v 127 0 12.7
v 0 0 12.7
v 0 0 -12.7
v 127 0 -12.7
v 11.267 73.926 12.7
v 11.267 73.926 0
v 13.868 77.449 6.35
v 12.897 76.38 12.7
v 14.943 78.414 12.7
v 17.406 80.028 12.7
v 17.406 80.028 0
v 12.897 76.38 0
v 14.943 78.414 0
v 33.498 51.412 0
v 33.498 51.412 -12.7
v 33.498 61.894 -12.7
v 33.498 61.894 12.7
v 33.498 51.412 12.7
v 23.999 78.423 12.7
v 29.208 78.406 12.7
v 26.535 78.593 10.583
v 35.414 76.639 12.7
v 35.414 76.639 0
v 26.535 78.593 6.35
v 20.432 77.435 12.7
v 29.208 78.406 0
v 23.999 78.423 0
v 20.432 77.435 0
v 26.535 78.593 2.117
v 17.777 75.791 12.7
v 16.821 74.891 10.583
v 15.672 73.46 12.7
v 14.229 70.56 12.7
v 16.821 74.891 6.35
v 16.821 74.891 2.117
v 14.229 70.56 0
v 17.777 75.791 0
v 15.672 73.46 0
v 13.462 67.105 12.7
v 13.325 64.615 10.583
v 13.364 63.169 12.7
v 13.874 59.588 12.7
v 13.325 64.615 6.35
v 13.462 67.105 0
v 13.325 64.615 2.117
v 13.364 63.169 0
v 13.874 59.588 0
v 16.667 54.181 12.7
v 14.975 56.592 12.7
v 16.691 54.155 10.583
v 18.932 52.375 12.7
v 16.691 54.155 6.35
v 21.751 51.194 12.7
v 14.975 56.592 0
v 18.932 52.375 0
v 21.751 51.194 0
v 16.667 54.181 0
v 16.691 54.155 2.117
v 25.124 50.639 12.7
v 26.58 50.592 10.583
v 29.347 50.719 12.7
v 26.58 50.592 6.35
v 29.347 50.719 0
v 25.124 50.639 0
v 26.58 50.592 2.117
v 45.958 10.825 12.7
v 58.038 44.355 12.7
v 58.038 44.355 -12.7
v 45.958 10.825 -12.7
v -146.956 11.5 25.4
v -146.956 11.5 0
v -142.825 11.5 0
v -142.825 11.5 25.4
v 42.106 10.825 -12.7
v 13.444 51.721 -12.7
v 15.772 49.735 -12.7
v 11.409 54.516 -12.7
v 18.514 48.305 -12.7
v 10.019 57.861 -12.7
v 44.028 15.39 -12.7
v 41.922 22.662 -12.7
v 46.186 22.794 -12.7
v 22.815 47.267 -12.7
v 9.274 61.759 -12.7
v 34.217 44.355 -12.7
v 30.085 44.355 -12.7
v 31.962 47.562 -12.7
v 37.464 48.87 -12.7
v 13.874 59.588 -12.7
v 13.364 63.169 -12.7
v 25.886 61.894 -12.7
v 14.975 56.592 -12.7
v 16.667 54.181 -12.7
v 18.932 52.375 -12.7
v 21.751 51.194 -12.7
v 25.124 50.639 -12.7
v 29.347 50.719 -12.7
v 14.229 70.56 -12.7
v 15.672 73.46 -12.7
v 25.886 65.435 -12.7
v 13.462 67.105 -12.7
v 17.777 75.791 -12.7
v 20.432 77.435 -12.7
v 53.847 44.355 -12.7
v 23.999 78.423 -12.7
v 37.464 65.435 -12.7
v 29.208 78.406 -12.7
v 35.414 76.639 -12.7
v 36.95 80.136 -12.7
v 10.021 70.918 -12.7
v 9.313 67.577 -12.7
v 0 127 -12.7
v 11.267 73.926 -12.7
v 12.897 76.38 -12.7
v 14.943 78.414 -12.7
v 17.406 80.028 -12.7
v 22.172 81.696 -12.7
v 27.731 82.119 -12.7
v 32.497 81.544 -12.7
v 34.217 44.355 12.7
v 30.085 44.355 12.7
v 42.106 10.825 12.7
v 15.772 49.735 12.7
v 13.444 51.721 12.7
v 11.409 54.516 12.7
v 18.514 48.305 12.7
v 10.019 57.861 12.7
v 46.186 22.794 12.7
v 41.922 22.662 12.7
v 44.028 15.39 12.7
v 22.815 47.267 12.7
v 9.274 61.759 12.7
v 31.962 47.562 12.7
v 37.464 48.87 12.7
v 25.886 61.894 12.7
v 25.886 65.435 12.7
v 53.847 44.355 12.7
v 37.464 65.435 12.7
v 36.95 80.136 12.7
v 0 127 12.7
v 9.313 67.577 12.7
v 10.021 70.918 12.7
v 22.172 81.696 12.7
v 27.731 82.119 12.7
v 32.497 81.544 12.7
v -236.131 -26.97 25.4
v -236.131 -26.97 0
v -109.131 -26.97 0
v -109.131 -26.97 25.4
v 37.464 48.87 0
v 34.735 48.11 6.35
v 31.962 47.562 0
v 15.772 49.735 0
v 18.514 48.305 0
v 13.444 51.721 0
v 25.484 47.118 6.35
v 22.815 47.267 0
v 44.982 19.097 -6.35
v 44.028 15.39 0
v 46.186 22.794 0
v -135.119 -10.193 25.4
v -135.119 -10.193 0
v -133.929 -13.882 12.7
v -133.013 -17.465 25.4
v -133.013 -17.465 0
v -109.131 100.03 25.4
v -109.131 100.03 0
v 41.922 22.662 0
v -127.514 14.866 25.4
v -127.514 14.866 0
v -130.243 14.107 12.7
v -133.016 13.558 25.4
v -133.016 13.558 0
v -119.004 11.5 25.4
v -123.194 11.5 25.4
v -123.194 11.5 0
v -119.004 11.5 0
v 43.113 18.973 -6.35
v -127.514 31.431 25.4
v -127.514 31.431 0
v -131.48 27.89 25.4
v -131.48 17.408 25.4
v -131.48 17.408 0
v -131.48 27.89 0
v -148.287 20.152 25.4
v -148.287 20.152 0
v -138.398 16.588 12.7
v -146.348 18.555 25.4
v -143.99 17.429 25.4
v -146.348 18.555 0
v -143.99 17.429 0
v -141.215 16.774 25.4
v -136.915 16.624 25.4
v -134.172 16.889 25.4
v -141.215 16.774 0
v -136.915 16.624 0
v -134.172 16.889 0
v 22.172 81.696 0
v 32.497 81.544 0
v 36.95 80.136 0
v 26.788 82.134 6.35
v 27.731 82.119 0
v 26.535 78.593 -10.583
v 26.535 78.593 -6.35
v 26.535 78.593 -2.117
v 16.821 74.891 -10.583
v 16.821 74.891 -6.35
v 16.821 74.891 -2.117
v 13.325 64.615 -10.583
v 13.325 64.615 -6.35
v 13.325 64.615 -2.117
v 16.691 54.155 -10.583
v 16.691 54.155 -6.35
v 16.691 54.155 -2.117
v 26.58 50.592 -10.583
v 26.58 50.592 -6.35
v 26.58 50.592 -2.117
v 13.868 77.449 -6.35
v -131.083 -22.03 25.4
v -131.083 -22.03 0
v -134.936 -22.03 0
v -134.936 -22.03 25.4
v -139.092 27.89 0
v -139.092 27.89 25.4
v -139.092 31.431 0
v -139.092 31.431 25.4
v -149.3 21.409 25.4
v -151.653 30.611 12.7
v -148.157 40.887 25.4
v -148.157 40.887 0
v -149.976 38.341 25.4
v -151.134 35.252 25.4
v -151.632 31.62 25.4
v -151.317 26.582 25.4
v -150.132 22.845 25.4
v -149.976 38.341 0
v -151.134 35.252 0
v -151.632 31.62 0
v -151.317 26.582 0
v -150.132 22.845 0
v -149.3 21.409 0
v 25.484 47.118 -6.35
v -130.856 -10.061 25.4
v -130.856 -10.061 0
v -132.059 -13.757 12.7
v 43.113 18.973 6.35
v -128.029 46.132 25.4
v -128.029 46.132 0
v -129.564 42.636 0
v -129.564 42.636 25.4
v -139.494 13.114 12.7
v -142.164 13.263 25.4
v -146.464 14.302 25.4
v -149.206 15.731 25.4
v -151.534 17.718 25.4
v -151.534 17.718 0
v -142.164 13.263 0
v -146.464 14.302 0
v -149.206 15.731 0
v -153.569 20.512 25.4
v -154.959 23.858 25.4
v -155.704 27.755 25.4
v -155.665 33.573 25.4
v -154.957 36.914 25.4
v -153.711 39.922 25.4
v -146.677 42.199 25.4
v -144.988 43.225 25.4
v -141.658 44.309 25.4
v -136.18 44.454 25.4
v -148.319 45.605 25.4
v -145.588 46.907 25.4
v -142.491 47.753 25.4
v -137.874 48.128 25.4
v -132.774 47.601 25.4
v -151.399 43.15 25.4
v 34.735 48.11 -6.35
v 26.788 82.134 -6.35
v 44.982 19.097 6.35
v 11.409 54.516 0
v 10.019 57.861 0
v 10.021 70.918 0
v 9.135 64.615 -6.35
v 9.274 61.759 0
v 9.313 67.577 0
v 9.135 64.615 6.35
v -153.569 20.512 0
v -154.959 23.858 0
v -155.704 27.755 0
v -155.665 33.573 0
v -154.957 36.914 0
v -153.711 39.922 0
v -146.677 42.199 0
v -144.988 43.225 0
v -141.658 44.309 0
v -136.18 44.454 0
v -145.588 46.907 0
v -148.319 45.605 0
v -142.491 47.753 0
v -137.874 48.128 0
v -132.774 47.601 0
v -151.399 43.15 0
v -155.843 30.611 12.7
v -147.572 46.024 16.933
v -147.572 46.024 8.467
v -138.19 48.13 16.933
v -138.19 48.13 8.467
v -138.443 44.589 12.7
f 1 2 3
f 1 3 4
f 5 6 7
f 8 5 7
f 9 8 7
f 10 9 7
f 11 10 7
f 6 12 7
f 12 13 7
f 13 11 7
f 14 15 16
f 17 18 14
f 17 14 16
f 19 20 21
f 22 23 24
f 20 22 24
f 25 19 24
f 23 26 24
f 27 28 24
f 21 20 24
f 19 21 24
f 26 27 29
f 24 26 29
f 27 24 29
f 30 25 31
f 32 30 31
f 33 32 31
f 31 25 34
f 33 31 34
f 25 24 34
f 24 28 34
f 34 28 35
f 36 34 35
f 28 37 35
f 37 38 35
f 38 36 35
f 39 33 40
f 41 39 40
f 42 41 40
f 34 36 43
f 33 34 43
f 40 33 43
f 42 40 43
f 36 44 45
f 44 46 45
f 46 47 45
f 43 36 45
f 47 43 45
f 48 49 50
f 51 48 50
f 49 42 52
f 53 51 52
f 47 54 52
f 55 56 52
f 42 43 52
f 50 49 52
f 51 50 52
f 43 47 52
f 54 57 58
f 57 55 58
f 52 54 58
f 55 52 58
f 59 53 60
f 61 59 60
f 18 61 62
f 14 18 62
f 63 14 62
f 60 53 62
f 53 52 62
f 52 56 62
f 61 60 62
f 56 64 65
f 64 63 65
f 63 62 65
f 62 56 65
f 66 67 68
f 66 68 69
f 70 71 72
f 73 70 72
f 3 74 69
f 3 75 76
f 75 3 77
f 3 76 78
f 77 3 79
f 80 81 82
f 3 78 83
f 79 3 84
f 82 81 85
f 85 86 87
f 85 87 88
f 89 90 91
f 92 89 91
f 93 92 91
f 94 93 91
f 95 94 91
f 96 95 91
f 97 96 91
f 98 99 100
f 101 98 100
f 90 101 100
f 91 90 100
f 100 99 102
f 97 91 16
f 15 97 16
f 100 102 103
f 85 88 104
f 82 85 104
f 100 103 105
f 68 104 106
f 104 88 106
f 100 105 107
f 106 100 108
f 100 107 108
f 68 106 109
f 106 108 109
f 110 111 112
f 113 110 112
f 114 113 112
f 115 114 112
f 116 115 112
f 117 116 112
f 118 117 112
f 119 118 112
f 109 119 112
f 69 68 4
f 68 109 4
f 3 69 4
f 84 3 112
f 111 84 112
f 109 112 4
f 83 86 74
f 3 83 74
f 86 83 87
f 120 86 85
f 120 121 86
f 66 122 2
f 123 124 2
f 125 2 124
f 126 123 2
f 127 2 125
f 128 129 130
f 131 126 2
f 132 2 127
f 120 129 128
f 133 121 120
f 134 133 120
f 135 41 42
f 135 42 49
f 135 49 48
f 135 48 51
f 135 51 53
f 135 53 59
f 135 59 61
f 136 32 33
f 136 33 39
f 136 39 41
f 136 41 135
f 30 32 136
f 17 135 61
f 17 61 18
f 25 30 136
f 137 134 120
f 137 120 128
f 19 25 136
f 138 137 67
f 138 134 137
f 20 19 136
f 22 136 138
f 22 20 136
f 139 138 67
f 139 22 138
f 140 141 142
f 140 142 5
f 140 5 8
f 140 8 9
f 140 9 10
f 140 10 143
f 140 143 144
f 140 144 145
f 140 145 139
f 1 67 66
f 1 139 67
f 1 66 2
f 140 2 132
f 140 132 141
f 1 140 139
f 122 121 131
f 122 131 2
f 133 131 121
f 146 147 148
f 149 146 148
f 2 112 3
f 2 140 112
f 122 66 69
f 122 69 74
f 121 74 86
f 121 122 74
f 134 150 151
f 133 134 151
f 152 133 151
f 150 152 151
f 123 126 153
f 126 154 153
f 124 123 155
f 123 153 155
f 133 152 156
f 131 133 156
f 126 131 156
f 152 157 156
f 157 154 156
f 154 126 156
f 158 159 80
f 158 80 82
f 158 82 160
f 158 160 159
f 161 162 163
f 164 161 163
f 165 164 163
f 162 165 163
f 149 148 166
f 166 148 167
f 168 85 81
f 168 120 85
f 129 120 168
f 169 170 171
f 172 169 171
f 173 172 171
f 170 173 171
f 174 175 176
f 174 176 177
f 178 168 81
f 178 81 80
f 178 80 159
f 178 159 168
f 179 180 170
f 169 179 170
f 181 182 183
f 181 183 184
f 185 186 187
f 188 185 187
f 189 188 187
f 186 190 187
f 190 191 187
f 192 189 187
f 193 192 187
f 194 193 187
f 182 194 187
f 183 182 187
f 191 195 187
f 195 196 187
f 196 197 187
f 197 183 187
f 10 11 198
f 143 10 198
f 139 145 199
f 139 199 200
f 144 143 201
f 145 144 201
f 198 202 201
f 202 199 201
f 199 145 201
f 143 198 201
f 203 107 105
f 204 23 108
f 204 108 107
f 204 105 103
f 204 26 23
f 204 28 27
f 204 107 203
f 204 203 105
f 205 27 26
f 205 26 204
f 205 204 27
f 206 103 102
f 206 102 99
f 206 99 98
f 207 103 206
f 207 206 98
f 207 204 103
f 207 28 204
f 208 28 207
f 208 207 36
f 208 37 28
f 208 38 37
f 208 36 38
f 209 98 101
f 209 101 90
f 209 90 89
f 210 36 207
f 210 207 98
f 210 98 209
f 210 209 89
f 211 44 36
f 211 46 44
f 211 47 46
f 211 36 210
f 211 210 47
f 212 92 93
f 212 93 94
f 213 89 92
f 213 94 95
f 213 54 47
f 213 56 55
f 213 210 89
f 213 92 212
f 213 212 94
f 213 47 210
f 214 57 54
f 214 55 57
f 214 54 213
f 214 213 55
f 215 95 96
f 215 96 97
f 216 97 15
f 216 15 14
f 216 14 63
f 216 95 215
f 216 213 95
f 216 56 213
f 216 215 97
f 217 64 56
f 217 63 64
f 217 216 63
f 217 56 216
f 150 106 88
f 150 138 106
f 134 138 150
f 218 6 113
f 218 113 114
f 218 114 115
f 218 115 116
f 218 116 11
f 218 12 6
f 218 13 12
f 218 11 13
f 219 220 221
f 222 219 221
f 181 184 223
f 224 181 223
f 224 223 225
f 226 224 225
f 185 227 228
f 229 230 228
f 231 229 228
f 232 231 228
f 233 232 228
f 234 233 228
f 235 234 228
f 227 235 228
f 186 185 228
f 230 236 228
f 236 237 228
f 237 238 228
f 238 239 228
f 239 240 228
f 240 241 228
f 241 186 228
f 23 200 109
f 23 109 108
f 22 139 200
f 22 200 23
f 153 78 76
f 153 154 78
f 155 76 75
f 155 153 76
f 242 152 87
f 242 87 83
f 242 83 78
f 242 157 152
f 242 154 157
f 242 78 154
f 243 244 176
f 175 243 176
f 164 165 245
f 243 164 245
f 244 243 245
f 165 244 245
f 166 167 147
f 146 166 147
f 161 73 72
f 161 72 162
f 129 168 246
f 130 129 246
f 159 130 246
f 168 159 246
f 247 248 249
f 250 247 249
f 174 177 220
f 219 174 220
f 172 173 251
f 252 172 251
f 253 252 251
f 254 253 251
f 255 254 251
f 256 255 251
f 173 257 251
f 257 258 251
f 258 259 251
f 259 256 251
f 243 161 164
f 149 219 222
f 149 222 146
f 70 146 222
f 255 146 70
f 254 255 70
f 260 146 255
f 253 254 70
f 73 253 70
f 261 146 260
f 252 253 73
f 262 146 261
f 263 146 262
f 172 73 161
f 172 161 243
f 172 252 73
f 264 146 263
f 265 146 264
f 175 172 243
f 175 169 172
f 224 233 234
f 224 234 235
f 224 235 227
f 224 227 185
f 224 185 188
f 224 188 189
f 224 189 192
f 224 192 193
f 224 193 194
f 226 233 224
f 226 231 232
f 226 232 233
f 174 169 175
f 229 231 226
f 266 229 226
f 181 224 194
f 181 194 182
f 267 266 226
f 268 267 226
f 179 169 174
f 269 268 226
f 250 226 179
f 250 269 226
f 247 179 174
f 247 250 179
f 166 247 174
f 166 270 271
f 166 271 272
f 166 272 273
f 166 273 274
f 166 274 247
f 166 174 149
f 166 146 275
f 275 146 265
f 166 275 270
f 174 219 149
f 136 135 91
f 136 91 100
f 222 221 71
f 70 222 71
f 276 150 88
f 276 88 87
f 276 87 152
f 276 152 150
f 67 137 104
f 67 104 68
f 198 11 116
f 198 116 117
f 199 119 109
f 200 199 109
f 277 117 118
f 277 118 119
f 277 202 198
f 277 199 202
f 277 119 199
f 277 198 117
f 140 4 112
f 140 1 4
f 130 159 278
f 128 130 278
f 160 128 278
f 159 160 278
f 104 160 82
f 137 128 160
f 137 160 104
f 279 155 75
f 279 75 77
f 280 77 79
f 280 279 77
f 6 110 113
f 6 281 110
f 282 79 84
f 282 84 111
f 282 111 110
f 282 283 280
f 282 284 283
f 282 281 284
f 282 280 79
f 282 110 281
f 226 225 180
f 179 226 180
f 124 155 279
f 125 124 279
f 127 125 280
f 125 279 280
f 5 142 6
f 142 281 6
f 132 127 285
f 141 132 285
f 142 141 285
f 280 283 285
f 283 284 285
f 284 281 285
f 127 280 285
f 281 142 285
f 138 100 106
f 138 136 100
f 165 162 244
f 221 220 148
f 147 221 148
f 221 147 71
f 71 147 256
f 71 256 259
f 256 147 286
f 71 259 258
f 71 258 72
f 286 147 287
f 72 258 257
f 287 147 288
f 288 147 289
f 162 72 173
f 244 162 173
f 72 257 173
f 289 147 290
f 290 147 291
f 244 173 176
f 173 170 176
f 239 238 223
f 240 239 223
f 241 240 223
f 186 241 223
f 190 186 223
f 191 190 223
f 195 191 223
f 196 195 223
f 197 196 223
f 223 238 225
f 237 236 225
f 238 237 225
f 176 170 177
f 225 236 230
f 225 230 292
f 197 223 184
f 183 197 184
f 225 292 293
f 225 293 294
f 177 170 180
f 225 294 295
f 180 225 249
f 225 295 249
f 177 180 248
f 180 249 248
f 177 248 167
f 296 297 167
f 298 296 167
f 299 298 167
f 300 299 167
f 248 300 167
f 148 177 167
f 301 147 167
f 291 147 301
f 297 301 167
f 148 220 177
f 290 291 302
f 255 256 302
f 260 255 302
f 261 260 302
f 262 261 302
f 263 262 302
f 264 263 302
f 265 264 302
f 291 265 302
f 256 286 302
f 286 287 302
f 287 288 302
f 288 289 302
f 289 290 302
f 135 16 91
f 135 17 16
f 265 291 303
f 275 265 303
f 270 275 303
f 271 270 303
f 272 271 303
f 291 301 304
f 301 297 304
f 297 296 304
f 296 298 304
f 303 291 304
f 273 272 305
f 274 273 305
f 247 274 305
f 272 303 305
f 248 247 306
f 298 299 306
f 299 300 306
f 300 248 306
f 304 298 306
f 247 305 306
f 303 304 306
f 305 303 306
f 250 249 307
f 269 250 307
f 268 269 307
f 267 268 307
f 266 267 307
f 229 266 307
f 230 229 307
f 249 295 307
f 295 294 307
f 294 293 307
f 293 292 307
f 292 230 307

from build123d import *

# Parameters (mm, degrees)
F1_DEPTH = 12.7
F3_DEPTH = 25.4


with BuildPart() as f1:
    # F0 (on Top) → F1 (new body, symmetric)
    with BuildSketch(Plane.XY):
        Polygon((0, 127), (0, 0), (127, 0), align=None)
        with BuildLine():
            Line((46.1859858478, 22.7941921039), (53.8473209017, 44.3545392191))
            Line((53.8473209017, 44.3545392191), (58.037572162, 44.3545392191))
            Line((58.037572162, 44.3545392191), (45.9584940982, 10.8251906931))
            Line((45.9584940982, 10.8251906931), (42.1058112406, 10.8251906931))
            Line((42.1058112406, 10.8251906931), (30.0854407251, 44.3545392191))
            Line((30.0854407251, 44.3545392191), (34.2169844371, 44.3545392191))
            Line((34.2169844371, 44.3545392191), (41.9223501522, 22.6621001202))
            add(Edge.make_bspline(
                [(41.9223501522, 22.6621001202), (43.2506084326, 18.9194939157), (44.0284834476, 15.3897025739)],
                knots=[0, 0, 0, 1, 1, 1], degree=2))
            add(Edge.make_bspline(
                [(44.0284834476, 15.3897025739), (44.8577275674, 19.1029550042), (46.1859858478, 22.7941921039)],
                knots=[0, 0, 0, 1, 1, 1], degree=2))
        make_face(mode=Mode.SUBTRACT)
        with BuildLine():
            Line((25.8864431332, 61.8936152508), (25.8864431332, 65.434705466))
            Line((25.8864431332, 65.434705466), (37.4639444053, 65.434705466))
            Line((37.4639444053, 65.434705466), (37.4639444053, 48.8698581855))
            add(Edge.make_bspline(
                [(37.4639444053, 48.8698581855), (34.7578059882, 48.0050866803), (31.9622084498, 47.5615185375)],
                knots=[0, 0, 0, 1, 1, 1], degree=2))
            add(Edge.make_bspline(
                [(31.9622084498, 47.5615185375), (29.1666109115, 47.1179503947), (25.4838770876, 47.1179503947)],
                knots=[0, 0, 0, 1, 1, 1], degree=2))
            add(Edge.make_bspline(
                [(25.4838770876, 47.1179503947), (17.7531180282, 47.1179503947), (13.4441703558, 51.7213676746)],
                knots=[0, 0, 0, 1, 1, 1], degree=2))
            add(Edge.make_bspline(
                [(13.4441703558, 51.7213676746), (9.1352226834, 56.3247849544), (9.1352226834, 64.6146635214)],
                knots=[0, 0, 0, 1, 1, 1], degree=2))
            add(Edge.make_bspline(
                [(9.1352226834, 64.6146635214), (9.1352226834, 69.9300263077), (11.2673317393, 73.9258670559)],
                knots=[0, 0, 0, 1, 1, 1], degree=2))
            add(Edge.make_bspline(
                [(11.2673317393, 73.9258670559), (13.3994407952, 77.921707804), (17.4064639335, 80.0277246162)],
                knots=[0, 0, 0, 1, 1, 1], degree=2))
            add(Edge.make_bspline(
                [(17.4064639335, 80.0277246162), (21.4134870718, 82.1337414285), (26.7884892722, 82.1337414285)],
                knots=[0, 0, 0, 1, 1, 1], degree=2))
            add(Edge.make_bspline(
                [(26.7884892722, 82.1337414285), (32.2454956671, 82.1337414285), (36.9495544583, 80.1358210544)],
                knots=[0, 0, 0, 1, 1, 1], degree=2))
            Line((36.9495544583, 80.1358210544), (35.4138395439, 76.6394603997))
            add(Edge.make_bspline(
                [(35.4138395439, 76.6394603997), (30.7992398739, 78.5926512132), (26.5350217621, 78.5926512132)],
                knots=[0, 0, 0, 1, 1, 1], degree=2))
            add(Edge.make_bspline(
                [(26.5350217621, 78.5926512132), (20.3176128368, 78.5926512132), (16.8212521821, 74.8912800724)],
                knots=[0, 0, 0, 1, 1, 1], degree=2))
            add(Edge.make_bspline(
                [(16.8212521821, 74.8912800724), (13.3248915275, 71.1899089317), (13.3248915275, 64.6146635214)],
                knots=[0, 0, 0, 1, 1, 1], degree=2))
            add(Edge.make_bspline(
                [(13.3248915275, 64.6146635214), (13.3248915275, 57.7188562602), (16.6907909637, 54.1554012646)],
                knots=[0, 0, 0, 1, 1, 1], degree=2))
            add(Edge.make_bspline(
                [(16.6907909637, 54.1554012646), (20.0566903998, 50.5919462691), (26.5797513227, 50.5919462691)],
                knots=[0, 0, 0, 1, 1, 1], degree=2))
            add(Edge.make_bspline(
                [(26.5797513227, 50.5919462691), (30.1208415379, 50.5919462691), (33.4979233642, 51.4119882137)],
                knots=[0, 0, 0, 1, 1, 1], degree=2))
            Line((33.4979233642, 51.4119882137), (33.4979233642, 61.8936152508))
            Line((33.4979233642, 61.8936152508), (25.8864431332, 61.8936152508))
        make_face(mode=Mode.SUBTRACT)
    extrude(amount=F1_DEPTH, both=True)


with BuildPart() as f3:
    # F2 (on Top) → F3 (new body)
    with BuildSketch(Plane.XY):
        Polygon((-236.1308187246, -26.9698947668), (-109.1308187246, -26.9698947668), (-109.1308187246, 100.0301052332), align=None)
        with BuildLine():
            Line((-130.855597427, -10.0607340742), (-123.1942623731, 11.499613041))
            Line((-123.1942623731, 11.499613041), (-119.0040111128, 11.499613041))
            Line((-119.0040111128, 11.499613041), (-131.0830891766, -22.0297354849))
            Line((-131.0830891766, -22.0297354849), (-134.9357720342, -22.0297354849))
            Line((-134.9357720342, -22.0297354849), (-146.9561425497, 11.499613041))
            Line((-146.9561425497, 11.499613041), (-142.8245988377, 11.499613041))
            Line((-142.8245988377, 11.499613041), (-135.1192331226, -10.1928260579))
            add(Edge.make_bspline(
                [(-135.1192331226, -10.1928260579), (-133.7909748422, -13.9354322623), (-133.0130998272, -17.4652236042)],
                knots=[0, 0, 0, 1, 1, 1], degree=2))
            add(Edge.make_bspline(
                [(-133.0130998272, -17.4652236042), (-132.1838557074, -13.7519711739), (-130.855597427, -10.0607340742)],
                knots=[0, 0, 0, 1, 1, 1], degree=2))
        make_face(mode=Mode.SUBTRACT)
        with BuildLine():
            Line((-139.0917088209, 27.8897888809), (-139.0917088209, 31.4308790962))
            Line((-139.0917088209, 31.4308790962), (-127.5142075488, 31.4308790962))
            Line((-127.5142075488, 31.4308790962), (-127.5142075488, 14.8660318156))
            add(Edge.make_bspline(
                [(-127.5142075488, 14.8660318156), (-130.2203459659, 14.0012603104), (-133.0159435042, 13.5576921677)],
                knots=[0, 0, 0, 1, 1, 1], degree=2))
            add(Edge.make_bspline(
                [(-133.0159435042, 13.5576921677), (-135.8115410426, 13.1141240249), (-139.4942748665, 13.1141240249)],
                knots=[0, 0, 0, 1, 1, 1], degree=2))
            add(Edge.make_bspline(
                [(-139.4942748665, 13.1141240249), (-147.2250339258, 13.1141240249), (-151.5339815983, 17.7175413047)],
                knots=[0, 0, 0, 1, 1, 1], degree=2))
            add(Edge.make_bspline(
                [(-151.5339815983, 17.7175413047), (-155.8429292707, 22.3209585845), (-155.8429292707, 30.6108371516)],
                knots=[0, 0, 0, 1, 1, 1], degree=2))
            add(Edge.make_bspline(
                [(-155.8429292707, 30.6108371516), (-155.8429292707, 35.9261999379), (-153.7108202148, 39.922040686)],
                knots=[0, 0, 0, 1, 1, 1], degree=2))
            add(Edge.make_bspline(
                [(-153.7108202148, 39.922040686), (-151.5787111589, 43.9178814342), (-147.5716880206, 46.0238982464)],
                knots=[0, 0, 0, 1, 1, 1], degree=2))
            add(Edge.make_bspline(
                [(-147.5716880206, 46.0238982464), (-143.5646648823, 48.1299150586), (-138.1896626819, 48.1299150586)],
                knots=[0, 0, 0, 1, 1, 1], degree=2))
            add(Edge.make_bspline(
                [(-138.1896626819, 48.1299150586), (-132.732656287, 48.1299150586), (-128.0285974958, 46.1319946845)],
                knots=[0, 0, 0, 1, 1, 1], degree=2))
            Line((-128.0285974958, 46.1319946845), (-129.5643124102, 42.6356340299))
            add(Edge.make_bspline(
                [(-129.5643124102, 42.6356340299), (-134.1789120802, 44.5888248434), (-138.443130192, 44.5888248434)],
                knots=[0, 0, 0, 1, 1, 1], degree=2))
            add(Edge.make_bspline(
                [(-138.443130192, 44.5888248434), (-144.6605391173, 44.5888248434), (-148.156899772, 40.8874537026)],
                knots=[0, 0, 0, 1, 1, 1], degree=2))
            add(Edge.make_bspline(
                [(-148.156899772, 40.8874537026), (-151.6532604266, 37.1860825618), (-151.6532604266, 30.6108371516)],
                knots=[0, 0, 0, 1, 1, 1], degree=2))
            add(Edge.make_bspline(
                [(-151.6532604266, 30.6108371516), (-151.6532604266, 23.7150298903), (-148.2873609904, 20.1515748948)],
                knots=[0, 0, 0, 1, 1, 1], degree=2))
            add(Edge.make_bspline(
                [(-148.2873609904, 20.1515748948), (-144.9214615542, 16.5881198992), (-138.3984006314, 16.5881198992)],
                knots=[0, 0, 0, 1, 1, 1], degree=2))
            add(Edge.make_bspline(
                [(-138.3984006314, 16.5881198992), (-134.8573104162, 16.5881198992), (-131.4802285898, 17.4081618438)],
                knots=[0, 0, 0, 1, 1, 1], degree=2))
            Line((-131.4802285898, 17.4081618438), (-131.4802285898, 27.8897888809))
            Line((-131.4802285898, 27.8897888809), (-139.0917088209, 27.8897888809))
        make_face(mode=Mode.SUBTRACT)
    extrude(amount=F3_DEPTH)


solid = Compound([f1.part, f3.part])
